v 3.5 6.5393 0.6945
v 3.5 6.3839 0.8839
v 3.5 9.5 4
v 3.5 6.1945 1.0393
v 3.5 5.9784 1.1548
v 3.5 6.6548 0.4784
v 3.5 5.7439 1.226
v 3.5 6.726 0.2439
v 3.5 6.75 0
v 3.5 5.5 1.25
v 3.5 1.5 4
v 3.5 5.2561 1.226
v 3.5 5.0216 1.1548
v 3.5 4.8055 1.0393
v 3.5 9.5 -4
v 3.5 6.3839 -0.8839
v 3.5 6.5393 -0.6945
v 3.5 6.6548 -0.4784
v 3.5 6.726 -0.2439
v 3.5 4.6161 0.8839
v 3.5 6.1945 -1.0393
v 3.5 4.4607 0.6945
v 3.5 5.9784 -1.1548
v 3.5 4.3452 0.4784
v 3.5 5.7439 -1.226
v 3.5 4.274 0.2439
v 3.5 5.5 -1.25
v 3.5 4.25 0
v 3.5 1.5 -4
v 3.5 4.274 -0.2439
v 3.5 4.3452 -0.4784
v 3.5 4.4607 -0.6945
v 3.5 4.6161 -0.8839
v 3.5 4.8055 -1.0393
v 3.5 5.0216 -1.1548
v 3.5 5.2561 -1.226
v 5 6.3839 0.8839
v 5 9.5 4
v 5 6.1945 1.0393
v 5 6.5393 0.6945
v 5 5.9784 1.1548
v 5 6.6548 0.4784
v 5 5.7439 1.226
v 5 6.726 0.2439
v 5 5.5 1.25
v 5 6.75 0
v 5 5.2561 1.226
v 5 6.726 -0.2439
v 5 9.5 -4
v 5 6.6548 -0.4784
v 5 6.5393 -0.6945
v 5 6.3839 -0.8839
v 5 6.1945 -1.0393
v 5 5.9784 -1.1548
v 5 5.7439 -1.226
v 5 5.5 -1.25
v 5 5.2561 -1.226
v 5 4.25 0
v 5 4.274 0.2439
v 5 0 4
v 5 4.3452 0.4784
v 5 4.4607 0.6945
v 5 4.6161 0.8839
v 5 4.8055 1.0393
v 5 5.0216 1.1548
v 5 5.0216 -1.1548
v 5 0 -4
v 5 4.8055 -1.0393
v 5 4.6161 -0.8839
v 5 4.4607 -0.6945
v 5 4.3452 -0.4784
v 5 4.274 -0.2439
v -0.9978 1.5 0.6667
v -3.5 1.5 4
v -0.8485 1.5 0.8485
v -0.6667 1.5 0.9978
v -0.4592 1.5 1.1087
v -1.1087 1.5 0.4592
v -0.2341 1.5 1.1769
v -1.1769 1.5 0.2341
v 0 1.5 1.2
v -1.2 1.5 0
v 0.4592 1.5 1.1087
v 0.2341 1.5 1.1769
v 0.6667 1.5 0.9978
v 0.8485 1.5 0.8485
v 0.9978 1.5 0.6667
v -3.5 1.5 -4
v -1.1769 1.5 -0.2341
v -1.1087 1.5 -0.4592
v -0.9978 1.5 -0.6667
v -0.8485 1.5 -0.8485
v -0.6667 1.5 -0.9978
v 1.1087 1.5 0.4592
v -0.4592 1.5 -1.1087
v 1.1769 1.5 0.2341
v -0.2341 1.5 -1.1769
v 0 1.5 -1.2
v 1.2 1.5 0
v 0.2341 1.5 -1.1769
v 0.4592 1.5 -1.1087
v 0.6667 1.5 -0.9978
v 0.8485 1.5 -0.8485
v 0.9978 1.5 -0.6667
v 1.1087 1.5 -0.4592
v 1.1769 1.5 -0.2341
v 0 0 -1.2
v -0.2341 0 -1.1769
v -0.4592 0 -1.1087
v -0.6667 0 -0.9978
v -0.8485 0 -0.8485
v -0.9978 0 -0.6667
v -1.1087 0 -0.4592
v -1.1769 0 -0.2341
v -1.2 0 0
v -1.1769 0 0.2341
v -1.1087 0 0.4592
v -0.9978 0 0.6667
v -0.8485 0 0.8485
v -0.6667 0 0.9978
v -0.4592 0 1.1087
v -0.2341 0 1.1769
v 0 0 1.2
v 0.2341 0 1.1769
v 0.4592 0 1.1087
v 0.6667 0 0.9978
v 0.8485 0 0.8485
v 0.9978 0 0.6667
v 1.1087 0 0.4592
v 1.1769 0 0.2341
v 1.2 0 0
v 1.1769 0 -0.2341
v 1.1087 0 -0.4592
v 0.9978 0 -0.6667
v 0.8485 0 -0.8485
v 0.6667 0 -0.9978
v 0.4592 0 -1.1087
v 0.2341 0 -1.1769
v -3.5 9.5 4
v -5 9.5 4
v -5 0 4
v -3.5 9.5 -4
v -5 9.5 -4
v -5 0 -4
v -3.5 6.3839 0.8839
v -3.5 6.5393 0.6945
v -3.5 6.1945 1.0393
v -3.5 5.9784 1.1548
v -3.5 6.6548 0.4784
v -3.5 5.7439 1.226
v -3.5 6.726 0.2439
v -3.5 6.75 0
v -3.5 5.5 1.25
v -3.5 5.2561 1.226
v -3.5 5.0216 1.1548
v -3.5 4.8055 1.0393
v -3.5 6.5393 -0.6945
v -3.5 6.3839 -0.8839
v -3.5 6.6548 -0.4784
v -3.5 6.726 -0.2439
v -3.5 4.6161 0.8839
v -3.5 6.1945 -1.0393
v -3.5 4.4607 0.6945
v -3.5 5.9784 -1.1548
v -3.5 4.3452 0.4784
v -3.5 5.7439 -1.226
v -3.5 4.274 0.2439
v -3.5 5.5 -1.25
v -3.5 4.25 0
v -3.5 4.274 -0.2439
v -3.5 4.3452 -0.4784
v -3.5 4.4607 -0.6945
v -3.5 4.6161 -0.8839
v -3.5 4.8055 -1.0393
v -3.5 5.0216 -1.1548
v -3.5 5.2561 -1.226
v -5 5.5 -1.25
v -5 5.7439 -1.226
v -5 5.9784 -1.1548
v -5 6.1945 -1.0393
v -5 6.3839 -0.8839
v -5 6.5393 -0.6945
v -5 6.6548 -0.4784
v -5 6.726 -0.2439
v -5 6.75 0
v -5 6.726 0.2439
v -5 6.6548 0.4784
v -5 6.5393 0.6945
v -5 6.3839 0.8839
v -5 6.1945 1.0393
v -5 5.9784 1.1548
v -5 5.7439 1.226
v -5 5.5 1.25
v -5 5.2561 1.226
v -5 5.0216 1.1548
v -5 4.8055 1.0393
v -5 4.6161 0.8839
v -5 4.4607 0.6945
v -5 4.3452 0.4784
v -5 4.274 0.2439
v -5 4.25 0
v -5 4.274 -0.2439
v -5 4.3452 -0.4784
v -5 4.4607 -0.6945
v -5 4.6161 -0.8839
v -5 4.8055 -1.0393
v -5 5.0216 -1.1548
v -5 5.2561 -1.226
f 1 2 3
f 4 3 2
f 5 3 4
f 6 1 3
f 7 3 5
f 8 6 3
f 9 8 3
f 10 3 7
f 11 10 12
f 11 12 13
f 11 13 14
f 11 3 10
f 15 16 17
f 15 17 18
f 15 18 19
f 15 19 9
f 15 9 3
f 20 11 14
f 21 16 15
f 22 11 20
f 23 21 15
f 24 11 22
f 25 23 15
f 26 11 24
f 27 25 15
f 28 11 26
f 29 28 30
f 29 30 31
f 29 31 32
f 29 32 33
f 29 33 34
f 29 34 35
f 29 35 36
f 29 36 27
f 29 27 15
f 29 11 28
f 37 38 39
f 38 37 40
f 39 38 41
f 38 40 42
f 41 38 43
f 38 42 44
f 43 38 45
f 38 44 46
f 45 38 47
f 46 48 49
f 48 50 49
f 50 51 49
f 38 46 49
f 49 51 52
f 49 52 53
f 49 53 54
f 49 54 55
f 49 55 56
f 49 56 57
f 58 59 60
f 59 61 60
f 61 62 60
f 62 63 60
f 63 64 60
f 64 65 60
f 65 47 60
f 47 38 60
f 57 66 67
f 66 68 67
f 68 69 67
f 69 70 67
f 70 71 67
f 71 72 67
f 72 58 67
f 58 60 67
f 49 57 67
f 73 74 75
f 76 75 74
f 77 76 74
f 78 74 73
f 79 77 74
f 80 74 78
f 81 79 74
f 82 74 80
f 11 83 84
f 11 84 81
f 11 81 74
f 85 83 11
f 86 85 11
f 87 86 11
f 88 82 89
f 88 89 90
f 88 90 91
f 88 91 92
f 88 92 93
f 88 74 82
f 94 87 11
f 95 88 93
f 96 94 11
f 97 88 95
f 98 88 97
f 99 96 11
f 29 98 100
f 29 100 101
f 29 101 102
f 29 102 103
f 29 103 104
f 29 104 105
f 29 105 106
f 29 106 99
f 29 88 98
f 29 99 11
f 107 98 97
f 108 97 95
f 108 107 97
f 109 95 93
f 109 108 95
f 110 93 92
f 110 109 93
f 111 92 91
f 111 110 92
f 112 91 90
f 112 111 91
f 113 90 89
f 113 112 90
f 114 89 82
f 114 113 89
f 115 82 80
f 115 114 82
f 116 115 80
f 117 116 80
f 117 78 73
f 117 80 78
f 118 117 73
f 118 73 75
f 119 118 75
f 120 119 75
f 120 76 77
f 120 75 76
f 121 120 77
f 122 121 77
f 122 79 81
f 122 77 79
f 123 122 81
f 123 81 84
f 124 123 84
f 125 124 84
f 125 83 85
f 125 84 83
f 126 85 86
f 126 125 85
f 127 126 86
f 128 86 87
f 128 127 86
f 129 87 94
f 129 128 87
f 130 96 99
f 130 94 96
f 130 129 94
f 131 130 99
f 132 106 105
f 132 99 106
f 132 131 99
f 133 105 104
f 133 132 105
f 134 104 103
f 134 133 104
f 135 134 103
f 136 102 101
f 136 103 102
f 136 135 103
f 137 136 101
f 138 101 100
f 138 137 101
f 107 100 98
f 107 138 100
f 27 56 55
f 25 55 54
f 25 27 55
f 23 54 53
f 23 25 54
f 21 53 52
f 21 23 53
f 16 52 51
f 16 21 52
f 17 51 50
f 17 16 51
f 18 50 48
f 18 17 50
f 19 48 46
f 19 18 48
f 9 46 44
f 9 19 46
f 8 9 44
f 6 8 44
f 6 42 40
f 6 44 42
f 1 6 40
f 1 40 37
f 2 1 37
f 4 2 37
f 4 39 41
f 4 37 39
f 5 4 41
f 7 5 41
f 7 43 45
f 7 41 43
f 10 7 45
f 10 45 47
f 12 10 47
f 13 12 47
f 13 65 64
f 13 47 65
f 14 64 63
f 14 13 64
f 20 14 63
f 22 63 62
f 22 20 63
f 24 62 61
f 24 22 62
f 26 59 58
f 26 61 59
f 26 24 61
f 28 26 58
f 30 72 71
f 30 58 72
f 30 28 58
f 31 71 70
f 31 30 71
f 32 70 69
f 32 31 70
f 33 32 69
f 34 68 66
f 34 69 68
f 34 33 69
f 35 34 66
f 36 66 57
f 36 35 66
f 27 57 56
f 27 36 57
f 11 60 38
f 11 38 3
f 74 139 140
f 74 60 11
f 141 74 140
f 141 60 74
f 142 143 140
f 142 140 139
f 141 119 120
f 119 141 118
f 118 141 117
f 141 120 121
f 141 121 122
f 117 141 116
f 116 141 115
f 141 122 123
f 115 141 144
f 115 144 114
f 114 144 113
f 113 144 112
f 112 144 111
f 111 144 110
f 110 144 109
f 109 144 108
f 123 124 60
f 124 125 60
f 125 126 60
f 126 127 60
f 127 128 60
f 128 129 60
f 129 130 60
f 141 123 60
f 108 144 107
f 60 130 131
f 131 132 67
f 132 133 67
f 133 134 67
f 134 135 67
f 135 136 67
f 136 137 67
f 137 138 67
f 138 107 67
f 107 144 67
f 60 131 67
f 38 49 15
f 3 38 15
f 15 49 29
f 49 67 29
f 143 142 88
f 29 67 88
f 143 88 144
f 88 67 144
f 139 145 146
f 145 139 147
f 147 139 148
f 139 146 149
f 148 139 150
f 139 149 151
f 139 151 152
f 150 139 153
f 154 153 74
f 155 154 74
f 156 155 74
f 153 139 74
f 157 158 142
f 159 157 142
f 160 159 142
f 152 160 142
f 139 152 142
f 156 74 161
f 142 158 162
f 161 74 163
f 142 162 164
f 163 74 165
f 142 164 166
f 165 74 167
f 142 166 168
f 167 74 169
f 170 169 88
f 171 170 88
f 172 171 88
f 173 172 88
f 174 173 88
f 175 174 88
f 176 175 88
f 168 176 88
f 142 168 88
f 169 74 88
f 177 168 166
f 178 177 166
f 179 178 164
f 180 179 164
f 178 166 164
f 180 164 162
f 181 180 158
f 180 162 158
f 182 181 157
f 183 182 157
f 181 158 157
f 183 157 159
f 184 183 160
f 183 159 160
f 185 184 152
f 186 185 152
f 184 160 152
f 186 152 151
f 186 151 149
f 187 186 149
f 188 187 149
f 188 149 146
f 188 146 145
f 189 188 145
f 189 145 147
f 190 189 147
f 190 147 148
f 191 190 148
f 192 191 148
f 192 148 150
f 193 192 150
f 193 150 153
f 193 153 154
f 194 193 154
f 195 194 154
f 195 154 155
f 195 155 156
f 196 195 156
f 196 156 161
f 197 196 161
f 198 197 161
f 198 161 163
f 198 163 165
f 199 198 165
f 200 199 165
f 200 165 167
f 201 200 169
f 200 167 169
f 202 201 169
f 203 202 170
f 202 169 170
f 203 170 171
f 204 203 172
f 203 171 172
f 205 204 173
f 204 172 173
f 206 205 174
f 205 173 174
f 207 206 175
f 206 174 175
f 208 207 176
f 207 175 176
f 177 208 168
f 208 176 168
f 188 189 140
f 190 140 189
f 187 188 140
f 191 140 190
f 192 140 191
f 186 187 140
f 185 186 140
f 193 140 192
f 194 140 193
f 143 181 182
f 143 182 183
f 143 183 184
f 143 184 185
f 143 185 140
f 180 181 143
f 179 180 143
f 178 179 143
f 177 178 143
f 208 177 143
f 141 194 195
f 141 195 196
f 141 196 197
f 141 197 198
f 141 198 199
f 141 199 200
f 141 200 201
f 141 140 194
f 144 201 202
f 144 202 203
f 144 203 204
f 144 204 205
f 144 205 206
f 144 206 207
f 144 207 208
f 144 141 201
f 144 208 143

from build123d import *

# Parameters (mm, degrees)
SKETCH1_W           = 10
SKETCH1_H           = 8
BOSS_EXTRUDE1_DEPTH = 1.5
SKETCH2_W           = 1.5
SKETCH2_H           = 8
BOSS_EXTRUDE2_DEPTH = 8
SKETCH4_R           = 1.25
CUT_EXTRUDE1_DEPTH  = 14.360389216
SKETCH5_R           = 1.2
CUT_EXTRUDE2_DEPTH  = 12.456439237


with BuildPart() as part:
    # Sketch1 → Boss-Extrude1 (new body)
    with BuildSketch(Plane(origin=(0, 0, 0), x_dir=(1, 0, 0), z_dir=(0, 1, 0))):
        Rectangle(SKETCH1_W, SKETCH1_H)
    extrude(amount=BOSS_EXTRUDE1_DEPTH)

    # Sketch2 → Boss-Extrude2 (add)
    with BuildSketch(Plane(origin=(0, 1.5, 0), x_dir=(1, 0, 0), z_dir=(0, 1, 0))):
        with Locations((-4.25, 0)):
            Rectangle(SKETCH2_W, SKETCH2_H)
    boss_extrude2 = extrude(amount=BOSS_EXTRUDE2_DEPTH)

    # Sketch4 → Cut-Extrude1 (cut, through all)
    with BuildSketch(Plane(origin=(-3.5, 0, 0), x_dir=(0, 0, -1), z_dir=(1, 0, 0))):
        with Locations((0, 5.5)):
            Circle(SKETCH4_R)
    cut_extrude1 = extrude(amount=-CUT_EXTRUDE1_DEPTH, mode=Mode.SUBTRACT)

    # Mirror2: Boss-Extrude2, Cut-Extrude1 across plane
    add(boss_extrude2.mirror(Plane(origin=(0, 0, 0), x_dir=(0, 0, 1), z_dir=(1, 0, 0))))
    add(cut_extrude1.mirror(Plane(origin=(0, 0, 0), x_dir=(0, 0, 1), z_dir=(1, 0, 0))), mode=Mode.SUBTRACT)

    # Sketch5 → Cut-Extrude2 (cut, through all)
    with BuildSketch(Plane(origin=(0, 0, 0), x_dir=(1, 0, 0), z_dir=(0, 1, 0))):
        with Locations(Location((0, 0, 0), (0, 0, 90))):
            Circle(SKETCH5_R)
    extrude(amount=CUT_EXTRUDE2_DEPTH, mode=Mode.SUBTRACT)


solid = part.part
